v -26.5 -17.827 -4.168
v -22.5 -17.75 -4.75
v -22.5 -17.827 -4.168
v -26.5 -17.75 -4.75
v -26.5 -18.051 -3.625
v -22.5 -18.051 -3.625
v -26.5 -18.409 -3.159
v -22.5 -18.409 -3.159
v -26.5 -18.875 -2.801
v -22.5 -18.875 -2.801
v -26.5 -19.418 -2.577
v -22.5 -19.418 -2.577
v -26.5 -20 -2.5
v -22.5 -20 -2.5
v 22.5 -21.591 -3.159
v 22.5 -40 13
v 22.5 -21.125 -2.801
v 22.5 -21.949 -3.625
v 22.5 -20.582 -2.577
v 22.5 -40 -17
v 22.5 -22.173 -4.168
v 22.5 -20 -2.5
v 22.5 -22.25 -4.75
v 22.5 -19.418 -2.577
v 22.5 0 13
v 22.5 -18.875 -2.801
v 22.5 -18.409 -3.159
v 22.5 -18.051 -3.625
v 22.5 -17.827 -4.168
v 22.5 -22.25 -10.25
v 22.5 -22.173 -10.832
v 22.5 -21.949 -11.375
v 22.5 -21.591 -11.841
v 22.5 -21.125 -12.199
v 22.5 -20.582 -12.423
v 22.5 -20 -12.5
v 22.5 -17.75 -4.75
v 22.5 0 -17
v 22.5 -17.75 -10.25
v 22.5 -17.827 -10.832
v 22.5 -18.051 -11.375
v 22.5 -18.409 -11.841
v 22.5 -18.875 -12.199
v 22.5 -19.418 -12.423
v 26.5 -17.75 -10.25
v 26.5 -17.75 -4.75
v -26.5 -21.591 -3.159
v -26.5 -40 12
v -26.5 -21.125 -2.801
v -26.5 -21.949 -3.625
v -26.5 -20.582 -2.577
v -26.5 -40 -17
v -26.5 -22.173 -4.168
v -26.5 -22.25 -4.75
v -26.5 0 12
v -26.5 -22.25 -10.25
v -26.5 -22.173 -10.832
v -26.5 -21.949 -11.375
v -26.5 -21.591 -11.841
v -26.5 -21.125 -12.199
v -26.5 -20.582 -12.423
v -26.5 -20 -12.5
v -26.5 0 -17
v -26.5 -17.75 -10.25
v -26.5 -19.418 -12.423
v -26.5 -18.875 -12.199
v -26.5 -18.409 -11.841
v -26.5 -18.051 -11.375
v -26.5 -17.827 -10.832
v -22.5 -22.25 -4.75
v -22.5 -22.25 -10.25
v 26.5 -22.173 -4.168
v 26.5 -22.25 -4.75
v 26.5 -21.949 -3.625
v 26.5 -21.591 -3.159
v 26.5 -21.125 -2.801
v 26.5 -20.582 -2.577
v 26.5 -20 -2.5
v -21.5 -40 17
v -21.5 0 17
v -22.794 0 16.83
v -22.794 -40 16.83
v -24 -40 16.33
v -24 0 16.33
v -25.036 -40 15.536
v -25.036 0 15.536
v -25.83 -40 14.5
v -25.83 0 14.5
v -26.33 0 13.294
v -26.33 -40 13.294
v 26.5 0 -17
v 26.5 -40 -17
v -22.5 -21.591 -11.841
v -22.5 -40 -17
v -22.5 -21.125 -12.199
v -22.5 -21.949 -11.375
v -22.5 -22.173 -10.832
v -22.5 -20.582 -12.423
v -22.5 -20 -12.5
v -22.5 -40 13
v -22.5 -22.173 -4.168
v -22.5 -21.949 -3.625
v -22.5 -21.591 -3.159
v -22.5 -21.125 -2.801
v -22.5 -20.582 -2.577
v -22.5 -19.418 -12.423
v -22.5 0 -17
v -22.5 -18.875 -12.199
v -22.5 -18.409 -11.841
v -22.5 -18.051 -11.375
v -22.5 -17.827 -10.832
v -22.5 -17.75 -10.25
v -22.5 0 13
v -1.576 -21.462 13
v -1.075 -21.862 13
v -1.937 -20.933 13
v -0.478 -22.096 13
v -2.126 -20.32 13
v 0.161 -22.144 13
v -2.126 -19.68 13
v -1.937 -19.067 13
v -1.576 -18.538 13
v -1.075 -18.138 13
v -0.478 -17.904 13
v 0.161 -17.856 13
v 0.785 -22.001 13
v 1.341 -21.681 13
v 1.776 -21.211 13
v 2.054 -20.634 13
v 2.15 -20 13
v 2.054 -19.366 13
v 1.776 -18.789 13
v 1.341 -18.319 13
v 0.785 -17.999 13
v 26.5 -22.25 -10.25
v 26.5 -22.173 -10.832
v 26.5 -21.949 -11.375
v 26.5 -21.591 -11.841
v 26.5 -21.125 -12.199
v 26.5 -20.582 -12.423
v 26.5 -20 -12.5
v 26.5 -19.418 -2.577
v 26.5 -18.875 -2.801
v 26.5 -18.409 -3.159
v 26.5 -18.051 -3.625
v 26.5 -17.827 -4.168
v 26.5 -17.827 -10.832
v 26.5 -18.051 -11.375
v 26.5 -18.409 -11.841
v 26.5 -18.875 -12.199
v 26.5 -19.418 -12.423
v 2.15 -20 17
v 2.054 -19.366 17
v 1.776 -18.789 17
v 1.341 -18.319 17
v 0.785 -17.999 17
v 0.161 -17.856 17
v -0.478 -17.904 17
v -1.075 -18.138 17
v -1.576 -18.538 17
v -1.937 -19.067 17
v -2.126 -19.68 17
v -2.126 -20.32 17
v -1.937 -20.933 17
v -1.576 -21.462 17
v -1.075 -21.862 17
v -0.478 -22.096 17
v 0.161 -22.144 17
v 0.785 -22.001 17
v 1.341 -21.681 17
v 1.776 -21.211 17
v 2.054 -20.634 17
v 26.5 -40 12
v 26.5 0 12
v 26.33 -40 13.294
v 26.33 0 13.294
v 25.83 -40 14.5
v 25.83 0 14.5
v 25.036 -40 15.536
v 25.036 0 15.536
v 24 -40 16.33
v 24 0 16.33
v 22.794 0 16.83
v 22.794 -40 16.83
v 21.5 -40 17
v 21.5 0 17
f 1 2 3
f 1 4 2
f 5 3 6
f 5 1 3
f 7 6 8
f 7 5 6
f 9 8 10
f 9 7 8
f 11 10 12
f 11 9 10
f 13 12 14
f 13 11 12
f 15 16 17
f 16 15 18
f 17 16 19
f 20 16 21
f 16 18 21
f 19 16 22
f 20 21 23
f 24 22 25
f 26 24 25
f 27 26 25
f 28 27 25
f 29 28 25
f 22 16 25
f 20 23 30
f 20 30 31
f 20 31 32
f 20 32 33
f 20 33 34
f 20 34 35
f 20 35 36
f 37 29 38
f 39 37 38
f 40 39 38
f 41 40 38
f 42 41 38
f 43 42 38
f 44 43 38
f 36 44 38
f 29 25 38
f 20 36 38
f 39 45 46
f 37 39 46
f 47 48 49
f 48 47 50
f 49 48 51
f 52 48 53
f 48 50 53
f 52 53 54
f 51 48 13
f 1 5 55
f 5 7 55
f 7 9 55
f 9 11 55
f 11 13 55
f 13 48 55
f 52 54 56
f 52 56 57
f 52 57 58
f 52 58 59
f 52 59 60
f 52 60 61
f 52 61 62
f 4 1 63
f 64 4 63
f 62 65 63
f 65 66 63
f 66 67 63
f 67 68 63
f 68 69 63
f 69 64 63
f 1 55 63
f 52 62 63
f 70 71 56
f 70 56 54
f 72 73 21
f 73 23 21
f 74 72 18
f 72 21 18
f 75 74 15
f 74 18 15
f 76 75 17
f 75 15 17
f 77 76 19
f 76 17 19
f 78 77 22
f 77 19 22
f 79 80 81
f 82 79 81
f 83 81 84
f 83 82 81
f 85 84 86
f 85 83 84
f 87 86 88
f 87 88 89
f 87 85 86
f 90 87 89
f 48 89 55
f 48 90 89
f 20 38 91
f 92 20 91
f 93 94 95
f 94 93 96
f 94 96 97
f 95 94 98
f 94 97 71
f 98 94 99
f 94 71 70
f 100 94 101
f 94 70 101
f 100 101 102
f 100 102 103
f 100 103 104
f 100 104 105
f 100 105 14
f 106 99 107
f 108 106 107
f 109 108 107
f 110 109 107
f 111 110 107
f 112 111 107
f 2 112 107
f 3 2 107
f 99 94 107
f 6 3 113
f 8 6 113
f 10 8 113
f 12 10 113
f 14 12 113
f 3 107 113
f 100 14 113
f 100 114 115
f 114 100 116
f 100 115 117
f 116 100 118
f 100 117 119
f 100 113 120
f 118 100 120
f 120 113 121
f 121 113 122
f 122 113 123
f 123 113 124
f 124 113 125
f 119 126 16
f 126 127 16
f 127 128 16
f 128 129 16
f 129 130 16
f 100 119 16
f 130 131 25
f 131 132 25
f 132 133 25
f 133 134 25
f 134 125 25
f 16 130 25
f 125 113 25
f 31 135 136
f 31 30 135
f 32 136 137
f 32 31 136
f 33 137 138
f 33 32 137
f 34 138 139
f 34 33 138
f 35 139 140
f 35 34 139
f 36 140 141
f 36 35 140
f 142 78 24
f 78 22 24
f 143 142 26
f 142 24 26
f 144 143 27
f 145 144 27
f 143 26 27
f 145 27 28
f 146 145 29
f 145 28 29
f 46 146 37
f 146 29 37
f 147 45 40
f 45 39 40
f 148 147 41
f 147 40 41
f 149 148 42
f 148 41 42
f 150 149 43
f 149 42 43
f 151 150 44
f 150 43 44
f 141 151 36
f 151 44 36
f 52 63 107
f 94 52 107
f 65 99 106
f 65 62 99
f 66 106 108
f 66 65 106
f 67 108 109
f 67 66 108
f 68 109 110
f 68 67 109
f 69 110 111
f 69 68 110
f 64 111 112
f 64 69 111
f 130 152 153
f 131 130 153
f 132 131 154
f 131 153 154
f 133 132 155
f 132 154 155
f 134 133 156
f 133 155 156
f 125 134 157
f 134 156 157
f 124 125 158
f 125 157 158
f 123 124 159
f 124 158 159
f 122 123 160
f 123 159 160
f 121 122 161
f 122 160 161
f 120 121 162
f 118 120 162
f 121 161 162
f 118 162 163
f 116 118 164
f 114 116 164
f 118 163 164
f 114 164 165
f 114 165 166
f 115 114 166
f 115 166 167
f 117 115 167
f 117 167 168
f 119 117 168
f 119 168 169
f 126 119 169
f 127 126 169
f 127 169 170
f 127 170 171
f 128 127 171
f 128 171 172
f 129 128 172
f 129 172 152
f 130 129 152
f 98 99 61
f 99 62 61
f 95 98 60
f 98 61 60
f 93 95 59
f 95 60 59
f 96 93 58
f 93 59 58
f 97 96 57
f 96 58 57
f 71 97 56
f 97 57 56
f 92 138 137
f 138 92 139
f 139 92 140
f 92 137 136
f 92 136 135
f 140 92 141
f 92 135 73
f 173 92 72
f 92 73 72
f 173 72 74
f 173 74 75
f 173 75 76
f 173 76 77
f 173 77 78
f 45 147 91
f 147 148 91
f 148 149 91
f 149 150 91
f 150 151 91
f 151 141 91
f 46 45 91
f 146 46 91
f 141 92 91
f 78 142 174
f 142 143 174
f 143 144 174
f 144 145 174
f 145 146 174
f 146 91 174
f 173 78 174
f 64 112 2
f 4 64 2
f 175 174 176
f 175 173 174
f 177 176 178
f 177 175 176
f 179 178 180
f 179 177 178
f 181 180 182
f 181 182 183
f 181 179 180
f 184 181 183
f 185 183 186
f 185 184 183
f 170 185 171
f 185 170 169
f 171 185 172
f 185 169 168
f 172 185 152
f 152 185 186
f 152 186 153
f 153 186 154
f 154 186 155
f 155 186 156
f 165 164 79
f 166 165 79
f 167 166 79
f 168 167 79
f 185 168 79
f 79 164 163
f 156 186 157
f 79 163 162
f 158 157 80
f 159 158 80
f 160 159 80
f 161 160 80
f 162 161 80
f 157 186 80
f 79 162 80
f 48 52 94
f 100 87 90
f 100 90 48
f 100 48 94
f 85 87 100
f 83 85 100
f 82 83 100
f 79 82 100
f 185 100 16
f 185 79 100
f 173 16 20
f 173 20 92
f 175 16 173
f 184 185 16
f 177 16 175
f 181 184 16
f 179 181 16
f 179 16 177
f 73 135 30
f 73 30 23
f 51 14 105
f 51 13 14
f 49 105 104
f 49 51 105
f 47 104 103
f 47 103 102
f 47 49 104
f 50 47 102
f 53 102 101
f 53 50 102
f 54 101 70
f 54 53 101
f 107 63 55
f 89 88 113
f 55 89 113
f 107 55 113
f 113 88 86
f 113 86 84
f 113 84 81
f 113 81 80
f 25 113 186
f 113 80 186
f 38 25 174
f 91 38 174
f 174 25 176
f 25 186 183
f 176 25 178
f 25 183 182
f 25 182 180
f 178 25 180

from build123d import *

# Parameters (mm, degrees)
F1_DEPTH = 40
F2_R     = 5
F3_R     = 2.15
F4_DEPTH = 25
F5_W     = 4.5
F5_H     = 10
F6_DEPTH = 53.001
F7_R     = 2.24999


# Not quite as in the source:
# - a fillet or chamfer is up to 0.001 mm smaller than in the source, because OpenCascade refuses the exact size


with BuildPart() as f1:
    # F0 (on Front) → F1 (new body)
    with BuildSketch(Plane.XZ):
        Polygon((22.5, -17), (26.5, -17), (26.5, 17), (-26.5, 17), (-26.5, -17), (-22.5, -17), (-22.5, 13), (22.5, 13), align=None)
    extrude(amount=F1_DEPTH)

    # F2
    f2_edges = [f1.edges().sort_by_distance(p)[0] for p in [
        (-26.5, -20, 17),
        (26.5, -20, 17),
    ]]
    fillet(f2_edges, radius=F2_R)

    # F3 (on face) → F4 (cut)
    with BuildSketch(Plane.XY.offset(17)):
        with Locations((0, -20)):
            Circle(F3_R)
    extrude(amount=-F4_DEPTH, mode=Mode.SUBTRACT)

    # F5 (on face) → F6 (cut, through all)
    with BuildSketch(Plane.YZ.offset(26.5)):
        with Locations((-20, -7.5)):
            Rectangle(F5_W, F5_H)
    extrude(amount=-F6_DEPTH, mode=Mode.SUBTRACT)

    # F7 (radius 2.25 in the source; OpenCascade refuses exactly that, so slightly less here)
    f7_edges = [f1.edges().sort_by_distance(p)[0] for p in [
        (24.5, -17.75, -2.5),
        (24.5, -22.25, -2.5),
        (24.5, -17.75, -12.5),
        (24.5, -22.25, -12.5),
        (-24.5, -17.75, -2.5),
        (-24.5, -17.75, -12.5),
        (-24.5, -22.25, -2.5),
        (-24.5, -22.25, -12.5),
    ]]
    fillet(f7_edges, radius=F7_R)


solid = f1.part
